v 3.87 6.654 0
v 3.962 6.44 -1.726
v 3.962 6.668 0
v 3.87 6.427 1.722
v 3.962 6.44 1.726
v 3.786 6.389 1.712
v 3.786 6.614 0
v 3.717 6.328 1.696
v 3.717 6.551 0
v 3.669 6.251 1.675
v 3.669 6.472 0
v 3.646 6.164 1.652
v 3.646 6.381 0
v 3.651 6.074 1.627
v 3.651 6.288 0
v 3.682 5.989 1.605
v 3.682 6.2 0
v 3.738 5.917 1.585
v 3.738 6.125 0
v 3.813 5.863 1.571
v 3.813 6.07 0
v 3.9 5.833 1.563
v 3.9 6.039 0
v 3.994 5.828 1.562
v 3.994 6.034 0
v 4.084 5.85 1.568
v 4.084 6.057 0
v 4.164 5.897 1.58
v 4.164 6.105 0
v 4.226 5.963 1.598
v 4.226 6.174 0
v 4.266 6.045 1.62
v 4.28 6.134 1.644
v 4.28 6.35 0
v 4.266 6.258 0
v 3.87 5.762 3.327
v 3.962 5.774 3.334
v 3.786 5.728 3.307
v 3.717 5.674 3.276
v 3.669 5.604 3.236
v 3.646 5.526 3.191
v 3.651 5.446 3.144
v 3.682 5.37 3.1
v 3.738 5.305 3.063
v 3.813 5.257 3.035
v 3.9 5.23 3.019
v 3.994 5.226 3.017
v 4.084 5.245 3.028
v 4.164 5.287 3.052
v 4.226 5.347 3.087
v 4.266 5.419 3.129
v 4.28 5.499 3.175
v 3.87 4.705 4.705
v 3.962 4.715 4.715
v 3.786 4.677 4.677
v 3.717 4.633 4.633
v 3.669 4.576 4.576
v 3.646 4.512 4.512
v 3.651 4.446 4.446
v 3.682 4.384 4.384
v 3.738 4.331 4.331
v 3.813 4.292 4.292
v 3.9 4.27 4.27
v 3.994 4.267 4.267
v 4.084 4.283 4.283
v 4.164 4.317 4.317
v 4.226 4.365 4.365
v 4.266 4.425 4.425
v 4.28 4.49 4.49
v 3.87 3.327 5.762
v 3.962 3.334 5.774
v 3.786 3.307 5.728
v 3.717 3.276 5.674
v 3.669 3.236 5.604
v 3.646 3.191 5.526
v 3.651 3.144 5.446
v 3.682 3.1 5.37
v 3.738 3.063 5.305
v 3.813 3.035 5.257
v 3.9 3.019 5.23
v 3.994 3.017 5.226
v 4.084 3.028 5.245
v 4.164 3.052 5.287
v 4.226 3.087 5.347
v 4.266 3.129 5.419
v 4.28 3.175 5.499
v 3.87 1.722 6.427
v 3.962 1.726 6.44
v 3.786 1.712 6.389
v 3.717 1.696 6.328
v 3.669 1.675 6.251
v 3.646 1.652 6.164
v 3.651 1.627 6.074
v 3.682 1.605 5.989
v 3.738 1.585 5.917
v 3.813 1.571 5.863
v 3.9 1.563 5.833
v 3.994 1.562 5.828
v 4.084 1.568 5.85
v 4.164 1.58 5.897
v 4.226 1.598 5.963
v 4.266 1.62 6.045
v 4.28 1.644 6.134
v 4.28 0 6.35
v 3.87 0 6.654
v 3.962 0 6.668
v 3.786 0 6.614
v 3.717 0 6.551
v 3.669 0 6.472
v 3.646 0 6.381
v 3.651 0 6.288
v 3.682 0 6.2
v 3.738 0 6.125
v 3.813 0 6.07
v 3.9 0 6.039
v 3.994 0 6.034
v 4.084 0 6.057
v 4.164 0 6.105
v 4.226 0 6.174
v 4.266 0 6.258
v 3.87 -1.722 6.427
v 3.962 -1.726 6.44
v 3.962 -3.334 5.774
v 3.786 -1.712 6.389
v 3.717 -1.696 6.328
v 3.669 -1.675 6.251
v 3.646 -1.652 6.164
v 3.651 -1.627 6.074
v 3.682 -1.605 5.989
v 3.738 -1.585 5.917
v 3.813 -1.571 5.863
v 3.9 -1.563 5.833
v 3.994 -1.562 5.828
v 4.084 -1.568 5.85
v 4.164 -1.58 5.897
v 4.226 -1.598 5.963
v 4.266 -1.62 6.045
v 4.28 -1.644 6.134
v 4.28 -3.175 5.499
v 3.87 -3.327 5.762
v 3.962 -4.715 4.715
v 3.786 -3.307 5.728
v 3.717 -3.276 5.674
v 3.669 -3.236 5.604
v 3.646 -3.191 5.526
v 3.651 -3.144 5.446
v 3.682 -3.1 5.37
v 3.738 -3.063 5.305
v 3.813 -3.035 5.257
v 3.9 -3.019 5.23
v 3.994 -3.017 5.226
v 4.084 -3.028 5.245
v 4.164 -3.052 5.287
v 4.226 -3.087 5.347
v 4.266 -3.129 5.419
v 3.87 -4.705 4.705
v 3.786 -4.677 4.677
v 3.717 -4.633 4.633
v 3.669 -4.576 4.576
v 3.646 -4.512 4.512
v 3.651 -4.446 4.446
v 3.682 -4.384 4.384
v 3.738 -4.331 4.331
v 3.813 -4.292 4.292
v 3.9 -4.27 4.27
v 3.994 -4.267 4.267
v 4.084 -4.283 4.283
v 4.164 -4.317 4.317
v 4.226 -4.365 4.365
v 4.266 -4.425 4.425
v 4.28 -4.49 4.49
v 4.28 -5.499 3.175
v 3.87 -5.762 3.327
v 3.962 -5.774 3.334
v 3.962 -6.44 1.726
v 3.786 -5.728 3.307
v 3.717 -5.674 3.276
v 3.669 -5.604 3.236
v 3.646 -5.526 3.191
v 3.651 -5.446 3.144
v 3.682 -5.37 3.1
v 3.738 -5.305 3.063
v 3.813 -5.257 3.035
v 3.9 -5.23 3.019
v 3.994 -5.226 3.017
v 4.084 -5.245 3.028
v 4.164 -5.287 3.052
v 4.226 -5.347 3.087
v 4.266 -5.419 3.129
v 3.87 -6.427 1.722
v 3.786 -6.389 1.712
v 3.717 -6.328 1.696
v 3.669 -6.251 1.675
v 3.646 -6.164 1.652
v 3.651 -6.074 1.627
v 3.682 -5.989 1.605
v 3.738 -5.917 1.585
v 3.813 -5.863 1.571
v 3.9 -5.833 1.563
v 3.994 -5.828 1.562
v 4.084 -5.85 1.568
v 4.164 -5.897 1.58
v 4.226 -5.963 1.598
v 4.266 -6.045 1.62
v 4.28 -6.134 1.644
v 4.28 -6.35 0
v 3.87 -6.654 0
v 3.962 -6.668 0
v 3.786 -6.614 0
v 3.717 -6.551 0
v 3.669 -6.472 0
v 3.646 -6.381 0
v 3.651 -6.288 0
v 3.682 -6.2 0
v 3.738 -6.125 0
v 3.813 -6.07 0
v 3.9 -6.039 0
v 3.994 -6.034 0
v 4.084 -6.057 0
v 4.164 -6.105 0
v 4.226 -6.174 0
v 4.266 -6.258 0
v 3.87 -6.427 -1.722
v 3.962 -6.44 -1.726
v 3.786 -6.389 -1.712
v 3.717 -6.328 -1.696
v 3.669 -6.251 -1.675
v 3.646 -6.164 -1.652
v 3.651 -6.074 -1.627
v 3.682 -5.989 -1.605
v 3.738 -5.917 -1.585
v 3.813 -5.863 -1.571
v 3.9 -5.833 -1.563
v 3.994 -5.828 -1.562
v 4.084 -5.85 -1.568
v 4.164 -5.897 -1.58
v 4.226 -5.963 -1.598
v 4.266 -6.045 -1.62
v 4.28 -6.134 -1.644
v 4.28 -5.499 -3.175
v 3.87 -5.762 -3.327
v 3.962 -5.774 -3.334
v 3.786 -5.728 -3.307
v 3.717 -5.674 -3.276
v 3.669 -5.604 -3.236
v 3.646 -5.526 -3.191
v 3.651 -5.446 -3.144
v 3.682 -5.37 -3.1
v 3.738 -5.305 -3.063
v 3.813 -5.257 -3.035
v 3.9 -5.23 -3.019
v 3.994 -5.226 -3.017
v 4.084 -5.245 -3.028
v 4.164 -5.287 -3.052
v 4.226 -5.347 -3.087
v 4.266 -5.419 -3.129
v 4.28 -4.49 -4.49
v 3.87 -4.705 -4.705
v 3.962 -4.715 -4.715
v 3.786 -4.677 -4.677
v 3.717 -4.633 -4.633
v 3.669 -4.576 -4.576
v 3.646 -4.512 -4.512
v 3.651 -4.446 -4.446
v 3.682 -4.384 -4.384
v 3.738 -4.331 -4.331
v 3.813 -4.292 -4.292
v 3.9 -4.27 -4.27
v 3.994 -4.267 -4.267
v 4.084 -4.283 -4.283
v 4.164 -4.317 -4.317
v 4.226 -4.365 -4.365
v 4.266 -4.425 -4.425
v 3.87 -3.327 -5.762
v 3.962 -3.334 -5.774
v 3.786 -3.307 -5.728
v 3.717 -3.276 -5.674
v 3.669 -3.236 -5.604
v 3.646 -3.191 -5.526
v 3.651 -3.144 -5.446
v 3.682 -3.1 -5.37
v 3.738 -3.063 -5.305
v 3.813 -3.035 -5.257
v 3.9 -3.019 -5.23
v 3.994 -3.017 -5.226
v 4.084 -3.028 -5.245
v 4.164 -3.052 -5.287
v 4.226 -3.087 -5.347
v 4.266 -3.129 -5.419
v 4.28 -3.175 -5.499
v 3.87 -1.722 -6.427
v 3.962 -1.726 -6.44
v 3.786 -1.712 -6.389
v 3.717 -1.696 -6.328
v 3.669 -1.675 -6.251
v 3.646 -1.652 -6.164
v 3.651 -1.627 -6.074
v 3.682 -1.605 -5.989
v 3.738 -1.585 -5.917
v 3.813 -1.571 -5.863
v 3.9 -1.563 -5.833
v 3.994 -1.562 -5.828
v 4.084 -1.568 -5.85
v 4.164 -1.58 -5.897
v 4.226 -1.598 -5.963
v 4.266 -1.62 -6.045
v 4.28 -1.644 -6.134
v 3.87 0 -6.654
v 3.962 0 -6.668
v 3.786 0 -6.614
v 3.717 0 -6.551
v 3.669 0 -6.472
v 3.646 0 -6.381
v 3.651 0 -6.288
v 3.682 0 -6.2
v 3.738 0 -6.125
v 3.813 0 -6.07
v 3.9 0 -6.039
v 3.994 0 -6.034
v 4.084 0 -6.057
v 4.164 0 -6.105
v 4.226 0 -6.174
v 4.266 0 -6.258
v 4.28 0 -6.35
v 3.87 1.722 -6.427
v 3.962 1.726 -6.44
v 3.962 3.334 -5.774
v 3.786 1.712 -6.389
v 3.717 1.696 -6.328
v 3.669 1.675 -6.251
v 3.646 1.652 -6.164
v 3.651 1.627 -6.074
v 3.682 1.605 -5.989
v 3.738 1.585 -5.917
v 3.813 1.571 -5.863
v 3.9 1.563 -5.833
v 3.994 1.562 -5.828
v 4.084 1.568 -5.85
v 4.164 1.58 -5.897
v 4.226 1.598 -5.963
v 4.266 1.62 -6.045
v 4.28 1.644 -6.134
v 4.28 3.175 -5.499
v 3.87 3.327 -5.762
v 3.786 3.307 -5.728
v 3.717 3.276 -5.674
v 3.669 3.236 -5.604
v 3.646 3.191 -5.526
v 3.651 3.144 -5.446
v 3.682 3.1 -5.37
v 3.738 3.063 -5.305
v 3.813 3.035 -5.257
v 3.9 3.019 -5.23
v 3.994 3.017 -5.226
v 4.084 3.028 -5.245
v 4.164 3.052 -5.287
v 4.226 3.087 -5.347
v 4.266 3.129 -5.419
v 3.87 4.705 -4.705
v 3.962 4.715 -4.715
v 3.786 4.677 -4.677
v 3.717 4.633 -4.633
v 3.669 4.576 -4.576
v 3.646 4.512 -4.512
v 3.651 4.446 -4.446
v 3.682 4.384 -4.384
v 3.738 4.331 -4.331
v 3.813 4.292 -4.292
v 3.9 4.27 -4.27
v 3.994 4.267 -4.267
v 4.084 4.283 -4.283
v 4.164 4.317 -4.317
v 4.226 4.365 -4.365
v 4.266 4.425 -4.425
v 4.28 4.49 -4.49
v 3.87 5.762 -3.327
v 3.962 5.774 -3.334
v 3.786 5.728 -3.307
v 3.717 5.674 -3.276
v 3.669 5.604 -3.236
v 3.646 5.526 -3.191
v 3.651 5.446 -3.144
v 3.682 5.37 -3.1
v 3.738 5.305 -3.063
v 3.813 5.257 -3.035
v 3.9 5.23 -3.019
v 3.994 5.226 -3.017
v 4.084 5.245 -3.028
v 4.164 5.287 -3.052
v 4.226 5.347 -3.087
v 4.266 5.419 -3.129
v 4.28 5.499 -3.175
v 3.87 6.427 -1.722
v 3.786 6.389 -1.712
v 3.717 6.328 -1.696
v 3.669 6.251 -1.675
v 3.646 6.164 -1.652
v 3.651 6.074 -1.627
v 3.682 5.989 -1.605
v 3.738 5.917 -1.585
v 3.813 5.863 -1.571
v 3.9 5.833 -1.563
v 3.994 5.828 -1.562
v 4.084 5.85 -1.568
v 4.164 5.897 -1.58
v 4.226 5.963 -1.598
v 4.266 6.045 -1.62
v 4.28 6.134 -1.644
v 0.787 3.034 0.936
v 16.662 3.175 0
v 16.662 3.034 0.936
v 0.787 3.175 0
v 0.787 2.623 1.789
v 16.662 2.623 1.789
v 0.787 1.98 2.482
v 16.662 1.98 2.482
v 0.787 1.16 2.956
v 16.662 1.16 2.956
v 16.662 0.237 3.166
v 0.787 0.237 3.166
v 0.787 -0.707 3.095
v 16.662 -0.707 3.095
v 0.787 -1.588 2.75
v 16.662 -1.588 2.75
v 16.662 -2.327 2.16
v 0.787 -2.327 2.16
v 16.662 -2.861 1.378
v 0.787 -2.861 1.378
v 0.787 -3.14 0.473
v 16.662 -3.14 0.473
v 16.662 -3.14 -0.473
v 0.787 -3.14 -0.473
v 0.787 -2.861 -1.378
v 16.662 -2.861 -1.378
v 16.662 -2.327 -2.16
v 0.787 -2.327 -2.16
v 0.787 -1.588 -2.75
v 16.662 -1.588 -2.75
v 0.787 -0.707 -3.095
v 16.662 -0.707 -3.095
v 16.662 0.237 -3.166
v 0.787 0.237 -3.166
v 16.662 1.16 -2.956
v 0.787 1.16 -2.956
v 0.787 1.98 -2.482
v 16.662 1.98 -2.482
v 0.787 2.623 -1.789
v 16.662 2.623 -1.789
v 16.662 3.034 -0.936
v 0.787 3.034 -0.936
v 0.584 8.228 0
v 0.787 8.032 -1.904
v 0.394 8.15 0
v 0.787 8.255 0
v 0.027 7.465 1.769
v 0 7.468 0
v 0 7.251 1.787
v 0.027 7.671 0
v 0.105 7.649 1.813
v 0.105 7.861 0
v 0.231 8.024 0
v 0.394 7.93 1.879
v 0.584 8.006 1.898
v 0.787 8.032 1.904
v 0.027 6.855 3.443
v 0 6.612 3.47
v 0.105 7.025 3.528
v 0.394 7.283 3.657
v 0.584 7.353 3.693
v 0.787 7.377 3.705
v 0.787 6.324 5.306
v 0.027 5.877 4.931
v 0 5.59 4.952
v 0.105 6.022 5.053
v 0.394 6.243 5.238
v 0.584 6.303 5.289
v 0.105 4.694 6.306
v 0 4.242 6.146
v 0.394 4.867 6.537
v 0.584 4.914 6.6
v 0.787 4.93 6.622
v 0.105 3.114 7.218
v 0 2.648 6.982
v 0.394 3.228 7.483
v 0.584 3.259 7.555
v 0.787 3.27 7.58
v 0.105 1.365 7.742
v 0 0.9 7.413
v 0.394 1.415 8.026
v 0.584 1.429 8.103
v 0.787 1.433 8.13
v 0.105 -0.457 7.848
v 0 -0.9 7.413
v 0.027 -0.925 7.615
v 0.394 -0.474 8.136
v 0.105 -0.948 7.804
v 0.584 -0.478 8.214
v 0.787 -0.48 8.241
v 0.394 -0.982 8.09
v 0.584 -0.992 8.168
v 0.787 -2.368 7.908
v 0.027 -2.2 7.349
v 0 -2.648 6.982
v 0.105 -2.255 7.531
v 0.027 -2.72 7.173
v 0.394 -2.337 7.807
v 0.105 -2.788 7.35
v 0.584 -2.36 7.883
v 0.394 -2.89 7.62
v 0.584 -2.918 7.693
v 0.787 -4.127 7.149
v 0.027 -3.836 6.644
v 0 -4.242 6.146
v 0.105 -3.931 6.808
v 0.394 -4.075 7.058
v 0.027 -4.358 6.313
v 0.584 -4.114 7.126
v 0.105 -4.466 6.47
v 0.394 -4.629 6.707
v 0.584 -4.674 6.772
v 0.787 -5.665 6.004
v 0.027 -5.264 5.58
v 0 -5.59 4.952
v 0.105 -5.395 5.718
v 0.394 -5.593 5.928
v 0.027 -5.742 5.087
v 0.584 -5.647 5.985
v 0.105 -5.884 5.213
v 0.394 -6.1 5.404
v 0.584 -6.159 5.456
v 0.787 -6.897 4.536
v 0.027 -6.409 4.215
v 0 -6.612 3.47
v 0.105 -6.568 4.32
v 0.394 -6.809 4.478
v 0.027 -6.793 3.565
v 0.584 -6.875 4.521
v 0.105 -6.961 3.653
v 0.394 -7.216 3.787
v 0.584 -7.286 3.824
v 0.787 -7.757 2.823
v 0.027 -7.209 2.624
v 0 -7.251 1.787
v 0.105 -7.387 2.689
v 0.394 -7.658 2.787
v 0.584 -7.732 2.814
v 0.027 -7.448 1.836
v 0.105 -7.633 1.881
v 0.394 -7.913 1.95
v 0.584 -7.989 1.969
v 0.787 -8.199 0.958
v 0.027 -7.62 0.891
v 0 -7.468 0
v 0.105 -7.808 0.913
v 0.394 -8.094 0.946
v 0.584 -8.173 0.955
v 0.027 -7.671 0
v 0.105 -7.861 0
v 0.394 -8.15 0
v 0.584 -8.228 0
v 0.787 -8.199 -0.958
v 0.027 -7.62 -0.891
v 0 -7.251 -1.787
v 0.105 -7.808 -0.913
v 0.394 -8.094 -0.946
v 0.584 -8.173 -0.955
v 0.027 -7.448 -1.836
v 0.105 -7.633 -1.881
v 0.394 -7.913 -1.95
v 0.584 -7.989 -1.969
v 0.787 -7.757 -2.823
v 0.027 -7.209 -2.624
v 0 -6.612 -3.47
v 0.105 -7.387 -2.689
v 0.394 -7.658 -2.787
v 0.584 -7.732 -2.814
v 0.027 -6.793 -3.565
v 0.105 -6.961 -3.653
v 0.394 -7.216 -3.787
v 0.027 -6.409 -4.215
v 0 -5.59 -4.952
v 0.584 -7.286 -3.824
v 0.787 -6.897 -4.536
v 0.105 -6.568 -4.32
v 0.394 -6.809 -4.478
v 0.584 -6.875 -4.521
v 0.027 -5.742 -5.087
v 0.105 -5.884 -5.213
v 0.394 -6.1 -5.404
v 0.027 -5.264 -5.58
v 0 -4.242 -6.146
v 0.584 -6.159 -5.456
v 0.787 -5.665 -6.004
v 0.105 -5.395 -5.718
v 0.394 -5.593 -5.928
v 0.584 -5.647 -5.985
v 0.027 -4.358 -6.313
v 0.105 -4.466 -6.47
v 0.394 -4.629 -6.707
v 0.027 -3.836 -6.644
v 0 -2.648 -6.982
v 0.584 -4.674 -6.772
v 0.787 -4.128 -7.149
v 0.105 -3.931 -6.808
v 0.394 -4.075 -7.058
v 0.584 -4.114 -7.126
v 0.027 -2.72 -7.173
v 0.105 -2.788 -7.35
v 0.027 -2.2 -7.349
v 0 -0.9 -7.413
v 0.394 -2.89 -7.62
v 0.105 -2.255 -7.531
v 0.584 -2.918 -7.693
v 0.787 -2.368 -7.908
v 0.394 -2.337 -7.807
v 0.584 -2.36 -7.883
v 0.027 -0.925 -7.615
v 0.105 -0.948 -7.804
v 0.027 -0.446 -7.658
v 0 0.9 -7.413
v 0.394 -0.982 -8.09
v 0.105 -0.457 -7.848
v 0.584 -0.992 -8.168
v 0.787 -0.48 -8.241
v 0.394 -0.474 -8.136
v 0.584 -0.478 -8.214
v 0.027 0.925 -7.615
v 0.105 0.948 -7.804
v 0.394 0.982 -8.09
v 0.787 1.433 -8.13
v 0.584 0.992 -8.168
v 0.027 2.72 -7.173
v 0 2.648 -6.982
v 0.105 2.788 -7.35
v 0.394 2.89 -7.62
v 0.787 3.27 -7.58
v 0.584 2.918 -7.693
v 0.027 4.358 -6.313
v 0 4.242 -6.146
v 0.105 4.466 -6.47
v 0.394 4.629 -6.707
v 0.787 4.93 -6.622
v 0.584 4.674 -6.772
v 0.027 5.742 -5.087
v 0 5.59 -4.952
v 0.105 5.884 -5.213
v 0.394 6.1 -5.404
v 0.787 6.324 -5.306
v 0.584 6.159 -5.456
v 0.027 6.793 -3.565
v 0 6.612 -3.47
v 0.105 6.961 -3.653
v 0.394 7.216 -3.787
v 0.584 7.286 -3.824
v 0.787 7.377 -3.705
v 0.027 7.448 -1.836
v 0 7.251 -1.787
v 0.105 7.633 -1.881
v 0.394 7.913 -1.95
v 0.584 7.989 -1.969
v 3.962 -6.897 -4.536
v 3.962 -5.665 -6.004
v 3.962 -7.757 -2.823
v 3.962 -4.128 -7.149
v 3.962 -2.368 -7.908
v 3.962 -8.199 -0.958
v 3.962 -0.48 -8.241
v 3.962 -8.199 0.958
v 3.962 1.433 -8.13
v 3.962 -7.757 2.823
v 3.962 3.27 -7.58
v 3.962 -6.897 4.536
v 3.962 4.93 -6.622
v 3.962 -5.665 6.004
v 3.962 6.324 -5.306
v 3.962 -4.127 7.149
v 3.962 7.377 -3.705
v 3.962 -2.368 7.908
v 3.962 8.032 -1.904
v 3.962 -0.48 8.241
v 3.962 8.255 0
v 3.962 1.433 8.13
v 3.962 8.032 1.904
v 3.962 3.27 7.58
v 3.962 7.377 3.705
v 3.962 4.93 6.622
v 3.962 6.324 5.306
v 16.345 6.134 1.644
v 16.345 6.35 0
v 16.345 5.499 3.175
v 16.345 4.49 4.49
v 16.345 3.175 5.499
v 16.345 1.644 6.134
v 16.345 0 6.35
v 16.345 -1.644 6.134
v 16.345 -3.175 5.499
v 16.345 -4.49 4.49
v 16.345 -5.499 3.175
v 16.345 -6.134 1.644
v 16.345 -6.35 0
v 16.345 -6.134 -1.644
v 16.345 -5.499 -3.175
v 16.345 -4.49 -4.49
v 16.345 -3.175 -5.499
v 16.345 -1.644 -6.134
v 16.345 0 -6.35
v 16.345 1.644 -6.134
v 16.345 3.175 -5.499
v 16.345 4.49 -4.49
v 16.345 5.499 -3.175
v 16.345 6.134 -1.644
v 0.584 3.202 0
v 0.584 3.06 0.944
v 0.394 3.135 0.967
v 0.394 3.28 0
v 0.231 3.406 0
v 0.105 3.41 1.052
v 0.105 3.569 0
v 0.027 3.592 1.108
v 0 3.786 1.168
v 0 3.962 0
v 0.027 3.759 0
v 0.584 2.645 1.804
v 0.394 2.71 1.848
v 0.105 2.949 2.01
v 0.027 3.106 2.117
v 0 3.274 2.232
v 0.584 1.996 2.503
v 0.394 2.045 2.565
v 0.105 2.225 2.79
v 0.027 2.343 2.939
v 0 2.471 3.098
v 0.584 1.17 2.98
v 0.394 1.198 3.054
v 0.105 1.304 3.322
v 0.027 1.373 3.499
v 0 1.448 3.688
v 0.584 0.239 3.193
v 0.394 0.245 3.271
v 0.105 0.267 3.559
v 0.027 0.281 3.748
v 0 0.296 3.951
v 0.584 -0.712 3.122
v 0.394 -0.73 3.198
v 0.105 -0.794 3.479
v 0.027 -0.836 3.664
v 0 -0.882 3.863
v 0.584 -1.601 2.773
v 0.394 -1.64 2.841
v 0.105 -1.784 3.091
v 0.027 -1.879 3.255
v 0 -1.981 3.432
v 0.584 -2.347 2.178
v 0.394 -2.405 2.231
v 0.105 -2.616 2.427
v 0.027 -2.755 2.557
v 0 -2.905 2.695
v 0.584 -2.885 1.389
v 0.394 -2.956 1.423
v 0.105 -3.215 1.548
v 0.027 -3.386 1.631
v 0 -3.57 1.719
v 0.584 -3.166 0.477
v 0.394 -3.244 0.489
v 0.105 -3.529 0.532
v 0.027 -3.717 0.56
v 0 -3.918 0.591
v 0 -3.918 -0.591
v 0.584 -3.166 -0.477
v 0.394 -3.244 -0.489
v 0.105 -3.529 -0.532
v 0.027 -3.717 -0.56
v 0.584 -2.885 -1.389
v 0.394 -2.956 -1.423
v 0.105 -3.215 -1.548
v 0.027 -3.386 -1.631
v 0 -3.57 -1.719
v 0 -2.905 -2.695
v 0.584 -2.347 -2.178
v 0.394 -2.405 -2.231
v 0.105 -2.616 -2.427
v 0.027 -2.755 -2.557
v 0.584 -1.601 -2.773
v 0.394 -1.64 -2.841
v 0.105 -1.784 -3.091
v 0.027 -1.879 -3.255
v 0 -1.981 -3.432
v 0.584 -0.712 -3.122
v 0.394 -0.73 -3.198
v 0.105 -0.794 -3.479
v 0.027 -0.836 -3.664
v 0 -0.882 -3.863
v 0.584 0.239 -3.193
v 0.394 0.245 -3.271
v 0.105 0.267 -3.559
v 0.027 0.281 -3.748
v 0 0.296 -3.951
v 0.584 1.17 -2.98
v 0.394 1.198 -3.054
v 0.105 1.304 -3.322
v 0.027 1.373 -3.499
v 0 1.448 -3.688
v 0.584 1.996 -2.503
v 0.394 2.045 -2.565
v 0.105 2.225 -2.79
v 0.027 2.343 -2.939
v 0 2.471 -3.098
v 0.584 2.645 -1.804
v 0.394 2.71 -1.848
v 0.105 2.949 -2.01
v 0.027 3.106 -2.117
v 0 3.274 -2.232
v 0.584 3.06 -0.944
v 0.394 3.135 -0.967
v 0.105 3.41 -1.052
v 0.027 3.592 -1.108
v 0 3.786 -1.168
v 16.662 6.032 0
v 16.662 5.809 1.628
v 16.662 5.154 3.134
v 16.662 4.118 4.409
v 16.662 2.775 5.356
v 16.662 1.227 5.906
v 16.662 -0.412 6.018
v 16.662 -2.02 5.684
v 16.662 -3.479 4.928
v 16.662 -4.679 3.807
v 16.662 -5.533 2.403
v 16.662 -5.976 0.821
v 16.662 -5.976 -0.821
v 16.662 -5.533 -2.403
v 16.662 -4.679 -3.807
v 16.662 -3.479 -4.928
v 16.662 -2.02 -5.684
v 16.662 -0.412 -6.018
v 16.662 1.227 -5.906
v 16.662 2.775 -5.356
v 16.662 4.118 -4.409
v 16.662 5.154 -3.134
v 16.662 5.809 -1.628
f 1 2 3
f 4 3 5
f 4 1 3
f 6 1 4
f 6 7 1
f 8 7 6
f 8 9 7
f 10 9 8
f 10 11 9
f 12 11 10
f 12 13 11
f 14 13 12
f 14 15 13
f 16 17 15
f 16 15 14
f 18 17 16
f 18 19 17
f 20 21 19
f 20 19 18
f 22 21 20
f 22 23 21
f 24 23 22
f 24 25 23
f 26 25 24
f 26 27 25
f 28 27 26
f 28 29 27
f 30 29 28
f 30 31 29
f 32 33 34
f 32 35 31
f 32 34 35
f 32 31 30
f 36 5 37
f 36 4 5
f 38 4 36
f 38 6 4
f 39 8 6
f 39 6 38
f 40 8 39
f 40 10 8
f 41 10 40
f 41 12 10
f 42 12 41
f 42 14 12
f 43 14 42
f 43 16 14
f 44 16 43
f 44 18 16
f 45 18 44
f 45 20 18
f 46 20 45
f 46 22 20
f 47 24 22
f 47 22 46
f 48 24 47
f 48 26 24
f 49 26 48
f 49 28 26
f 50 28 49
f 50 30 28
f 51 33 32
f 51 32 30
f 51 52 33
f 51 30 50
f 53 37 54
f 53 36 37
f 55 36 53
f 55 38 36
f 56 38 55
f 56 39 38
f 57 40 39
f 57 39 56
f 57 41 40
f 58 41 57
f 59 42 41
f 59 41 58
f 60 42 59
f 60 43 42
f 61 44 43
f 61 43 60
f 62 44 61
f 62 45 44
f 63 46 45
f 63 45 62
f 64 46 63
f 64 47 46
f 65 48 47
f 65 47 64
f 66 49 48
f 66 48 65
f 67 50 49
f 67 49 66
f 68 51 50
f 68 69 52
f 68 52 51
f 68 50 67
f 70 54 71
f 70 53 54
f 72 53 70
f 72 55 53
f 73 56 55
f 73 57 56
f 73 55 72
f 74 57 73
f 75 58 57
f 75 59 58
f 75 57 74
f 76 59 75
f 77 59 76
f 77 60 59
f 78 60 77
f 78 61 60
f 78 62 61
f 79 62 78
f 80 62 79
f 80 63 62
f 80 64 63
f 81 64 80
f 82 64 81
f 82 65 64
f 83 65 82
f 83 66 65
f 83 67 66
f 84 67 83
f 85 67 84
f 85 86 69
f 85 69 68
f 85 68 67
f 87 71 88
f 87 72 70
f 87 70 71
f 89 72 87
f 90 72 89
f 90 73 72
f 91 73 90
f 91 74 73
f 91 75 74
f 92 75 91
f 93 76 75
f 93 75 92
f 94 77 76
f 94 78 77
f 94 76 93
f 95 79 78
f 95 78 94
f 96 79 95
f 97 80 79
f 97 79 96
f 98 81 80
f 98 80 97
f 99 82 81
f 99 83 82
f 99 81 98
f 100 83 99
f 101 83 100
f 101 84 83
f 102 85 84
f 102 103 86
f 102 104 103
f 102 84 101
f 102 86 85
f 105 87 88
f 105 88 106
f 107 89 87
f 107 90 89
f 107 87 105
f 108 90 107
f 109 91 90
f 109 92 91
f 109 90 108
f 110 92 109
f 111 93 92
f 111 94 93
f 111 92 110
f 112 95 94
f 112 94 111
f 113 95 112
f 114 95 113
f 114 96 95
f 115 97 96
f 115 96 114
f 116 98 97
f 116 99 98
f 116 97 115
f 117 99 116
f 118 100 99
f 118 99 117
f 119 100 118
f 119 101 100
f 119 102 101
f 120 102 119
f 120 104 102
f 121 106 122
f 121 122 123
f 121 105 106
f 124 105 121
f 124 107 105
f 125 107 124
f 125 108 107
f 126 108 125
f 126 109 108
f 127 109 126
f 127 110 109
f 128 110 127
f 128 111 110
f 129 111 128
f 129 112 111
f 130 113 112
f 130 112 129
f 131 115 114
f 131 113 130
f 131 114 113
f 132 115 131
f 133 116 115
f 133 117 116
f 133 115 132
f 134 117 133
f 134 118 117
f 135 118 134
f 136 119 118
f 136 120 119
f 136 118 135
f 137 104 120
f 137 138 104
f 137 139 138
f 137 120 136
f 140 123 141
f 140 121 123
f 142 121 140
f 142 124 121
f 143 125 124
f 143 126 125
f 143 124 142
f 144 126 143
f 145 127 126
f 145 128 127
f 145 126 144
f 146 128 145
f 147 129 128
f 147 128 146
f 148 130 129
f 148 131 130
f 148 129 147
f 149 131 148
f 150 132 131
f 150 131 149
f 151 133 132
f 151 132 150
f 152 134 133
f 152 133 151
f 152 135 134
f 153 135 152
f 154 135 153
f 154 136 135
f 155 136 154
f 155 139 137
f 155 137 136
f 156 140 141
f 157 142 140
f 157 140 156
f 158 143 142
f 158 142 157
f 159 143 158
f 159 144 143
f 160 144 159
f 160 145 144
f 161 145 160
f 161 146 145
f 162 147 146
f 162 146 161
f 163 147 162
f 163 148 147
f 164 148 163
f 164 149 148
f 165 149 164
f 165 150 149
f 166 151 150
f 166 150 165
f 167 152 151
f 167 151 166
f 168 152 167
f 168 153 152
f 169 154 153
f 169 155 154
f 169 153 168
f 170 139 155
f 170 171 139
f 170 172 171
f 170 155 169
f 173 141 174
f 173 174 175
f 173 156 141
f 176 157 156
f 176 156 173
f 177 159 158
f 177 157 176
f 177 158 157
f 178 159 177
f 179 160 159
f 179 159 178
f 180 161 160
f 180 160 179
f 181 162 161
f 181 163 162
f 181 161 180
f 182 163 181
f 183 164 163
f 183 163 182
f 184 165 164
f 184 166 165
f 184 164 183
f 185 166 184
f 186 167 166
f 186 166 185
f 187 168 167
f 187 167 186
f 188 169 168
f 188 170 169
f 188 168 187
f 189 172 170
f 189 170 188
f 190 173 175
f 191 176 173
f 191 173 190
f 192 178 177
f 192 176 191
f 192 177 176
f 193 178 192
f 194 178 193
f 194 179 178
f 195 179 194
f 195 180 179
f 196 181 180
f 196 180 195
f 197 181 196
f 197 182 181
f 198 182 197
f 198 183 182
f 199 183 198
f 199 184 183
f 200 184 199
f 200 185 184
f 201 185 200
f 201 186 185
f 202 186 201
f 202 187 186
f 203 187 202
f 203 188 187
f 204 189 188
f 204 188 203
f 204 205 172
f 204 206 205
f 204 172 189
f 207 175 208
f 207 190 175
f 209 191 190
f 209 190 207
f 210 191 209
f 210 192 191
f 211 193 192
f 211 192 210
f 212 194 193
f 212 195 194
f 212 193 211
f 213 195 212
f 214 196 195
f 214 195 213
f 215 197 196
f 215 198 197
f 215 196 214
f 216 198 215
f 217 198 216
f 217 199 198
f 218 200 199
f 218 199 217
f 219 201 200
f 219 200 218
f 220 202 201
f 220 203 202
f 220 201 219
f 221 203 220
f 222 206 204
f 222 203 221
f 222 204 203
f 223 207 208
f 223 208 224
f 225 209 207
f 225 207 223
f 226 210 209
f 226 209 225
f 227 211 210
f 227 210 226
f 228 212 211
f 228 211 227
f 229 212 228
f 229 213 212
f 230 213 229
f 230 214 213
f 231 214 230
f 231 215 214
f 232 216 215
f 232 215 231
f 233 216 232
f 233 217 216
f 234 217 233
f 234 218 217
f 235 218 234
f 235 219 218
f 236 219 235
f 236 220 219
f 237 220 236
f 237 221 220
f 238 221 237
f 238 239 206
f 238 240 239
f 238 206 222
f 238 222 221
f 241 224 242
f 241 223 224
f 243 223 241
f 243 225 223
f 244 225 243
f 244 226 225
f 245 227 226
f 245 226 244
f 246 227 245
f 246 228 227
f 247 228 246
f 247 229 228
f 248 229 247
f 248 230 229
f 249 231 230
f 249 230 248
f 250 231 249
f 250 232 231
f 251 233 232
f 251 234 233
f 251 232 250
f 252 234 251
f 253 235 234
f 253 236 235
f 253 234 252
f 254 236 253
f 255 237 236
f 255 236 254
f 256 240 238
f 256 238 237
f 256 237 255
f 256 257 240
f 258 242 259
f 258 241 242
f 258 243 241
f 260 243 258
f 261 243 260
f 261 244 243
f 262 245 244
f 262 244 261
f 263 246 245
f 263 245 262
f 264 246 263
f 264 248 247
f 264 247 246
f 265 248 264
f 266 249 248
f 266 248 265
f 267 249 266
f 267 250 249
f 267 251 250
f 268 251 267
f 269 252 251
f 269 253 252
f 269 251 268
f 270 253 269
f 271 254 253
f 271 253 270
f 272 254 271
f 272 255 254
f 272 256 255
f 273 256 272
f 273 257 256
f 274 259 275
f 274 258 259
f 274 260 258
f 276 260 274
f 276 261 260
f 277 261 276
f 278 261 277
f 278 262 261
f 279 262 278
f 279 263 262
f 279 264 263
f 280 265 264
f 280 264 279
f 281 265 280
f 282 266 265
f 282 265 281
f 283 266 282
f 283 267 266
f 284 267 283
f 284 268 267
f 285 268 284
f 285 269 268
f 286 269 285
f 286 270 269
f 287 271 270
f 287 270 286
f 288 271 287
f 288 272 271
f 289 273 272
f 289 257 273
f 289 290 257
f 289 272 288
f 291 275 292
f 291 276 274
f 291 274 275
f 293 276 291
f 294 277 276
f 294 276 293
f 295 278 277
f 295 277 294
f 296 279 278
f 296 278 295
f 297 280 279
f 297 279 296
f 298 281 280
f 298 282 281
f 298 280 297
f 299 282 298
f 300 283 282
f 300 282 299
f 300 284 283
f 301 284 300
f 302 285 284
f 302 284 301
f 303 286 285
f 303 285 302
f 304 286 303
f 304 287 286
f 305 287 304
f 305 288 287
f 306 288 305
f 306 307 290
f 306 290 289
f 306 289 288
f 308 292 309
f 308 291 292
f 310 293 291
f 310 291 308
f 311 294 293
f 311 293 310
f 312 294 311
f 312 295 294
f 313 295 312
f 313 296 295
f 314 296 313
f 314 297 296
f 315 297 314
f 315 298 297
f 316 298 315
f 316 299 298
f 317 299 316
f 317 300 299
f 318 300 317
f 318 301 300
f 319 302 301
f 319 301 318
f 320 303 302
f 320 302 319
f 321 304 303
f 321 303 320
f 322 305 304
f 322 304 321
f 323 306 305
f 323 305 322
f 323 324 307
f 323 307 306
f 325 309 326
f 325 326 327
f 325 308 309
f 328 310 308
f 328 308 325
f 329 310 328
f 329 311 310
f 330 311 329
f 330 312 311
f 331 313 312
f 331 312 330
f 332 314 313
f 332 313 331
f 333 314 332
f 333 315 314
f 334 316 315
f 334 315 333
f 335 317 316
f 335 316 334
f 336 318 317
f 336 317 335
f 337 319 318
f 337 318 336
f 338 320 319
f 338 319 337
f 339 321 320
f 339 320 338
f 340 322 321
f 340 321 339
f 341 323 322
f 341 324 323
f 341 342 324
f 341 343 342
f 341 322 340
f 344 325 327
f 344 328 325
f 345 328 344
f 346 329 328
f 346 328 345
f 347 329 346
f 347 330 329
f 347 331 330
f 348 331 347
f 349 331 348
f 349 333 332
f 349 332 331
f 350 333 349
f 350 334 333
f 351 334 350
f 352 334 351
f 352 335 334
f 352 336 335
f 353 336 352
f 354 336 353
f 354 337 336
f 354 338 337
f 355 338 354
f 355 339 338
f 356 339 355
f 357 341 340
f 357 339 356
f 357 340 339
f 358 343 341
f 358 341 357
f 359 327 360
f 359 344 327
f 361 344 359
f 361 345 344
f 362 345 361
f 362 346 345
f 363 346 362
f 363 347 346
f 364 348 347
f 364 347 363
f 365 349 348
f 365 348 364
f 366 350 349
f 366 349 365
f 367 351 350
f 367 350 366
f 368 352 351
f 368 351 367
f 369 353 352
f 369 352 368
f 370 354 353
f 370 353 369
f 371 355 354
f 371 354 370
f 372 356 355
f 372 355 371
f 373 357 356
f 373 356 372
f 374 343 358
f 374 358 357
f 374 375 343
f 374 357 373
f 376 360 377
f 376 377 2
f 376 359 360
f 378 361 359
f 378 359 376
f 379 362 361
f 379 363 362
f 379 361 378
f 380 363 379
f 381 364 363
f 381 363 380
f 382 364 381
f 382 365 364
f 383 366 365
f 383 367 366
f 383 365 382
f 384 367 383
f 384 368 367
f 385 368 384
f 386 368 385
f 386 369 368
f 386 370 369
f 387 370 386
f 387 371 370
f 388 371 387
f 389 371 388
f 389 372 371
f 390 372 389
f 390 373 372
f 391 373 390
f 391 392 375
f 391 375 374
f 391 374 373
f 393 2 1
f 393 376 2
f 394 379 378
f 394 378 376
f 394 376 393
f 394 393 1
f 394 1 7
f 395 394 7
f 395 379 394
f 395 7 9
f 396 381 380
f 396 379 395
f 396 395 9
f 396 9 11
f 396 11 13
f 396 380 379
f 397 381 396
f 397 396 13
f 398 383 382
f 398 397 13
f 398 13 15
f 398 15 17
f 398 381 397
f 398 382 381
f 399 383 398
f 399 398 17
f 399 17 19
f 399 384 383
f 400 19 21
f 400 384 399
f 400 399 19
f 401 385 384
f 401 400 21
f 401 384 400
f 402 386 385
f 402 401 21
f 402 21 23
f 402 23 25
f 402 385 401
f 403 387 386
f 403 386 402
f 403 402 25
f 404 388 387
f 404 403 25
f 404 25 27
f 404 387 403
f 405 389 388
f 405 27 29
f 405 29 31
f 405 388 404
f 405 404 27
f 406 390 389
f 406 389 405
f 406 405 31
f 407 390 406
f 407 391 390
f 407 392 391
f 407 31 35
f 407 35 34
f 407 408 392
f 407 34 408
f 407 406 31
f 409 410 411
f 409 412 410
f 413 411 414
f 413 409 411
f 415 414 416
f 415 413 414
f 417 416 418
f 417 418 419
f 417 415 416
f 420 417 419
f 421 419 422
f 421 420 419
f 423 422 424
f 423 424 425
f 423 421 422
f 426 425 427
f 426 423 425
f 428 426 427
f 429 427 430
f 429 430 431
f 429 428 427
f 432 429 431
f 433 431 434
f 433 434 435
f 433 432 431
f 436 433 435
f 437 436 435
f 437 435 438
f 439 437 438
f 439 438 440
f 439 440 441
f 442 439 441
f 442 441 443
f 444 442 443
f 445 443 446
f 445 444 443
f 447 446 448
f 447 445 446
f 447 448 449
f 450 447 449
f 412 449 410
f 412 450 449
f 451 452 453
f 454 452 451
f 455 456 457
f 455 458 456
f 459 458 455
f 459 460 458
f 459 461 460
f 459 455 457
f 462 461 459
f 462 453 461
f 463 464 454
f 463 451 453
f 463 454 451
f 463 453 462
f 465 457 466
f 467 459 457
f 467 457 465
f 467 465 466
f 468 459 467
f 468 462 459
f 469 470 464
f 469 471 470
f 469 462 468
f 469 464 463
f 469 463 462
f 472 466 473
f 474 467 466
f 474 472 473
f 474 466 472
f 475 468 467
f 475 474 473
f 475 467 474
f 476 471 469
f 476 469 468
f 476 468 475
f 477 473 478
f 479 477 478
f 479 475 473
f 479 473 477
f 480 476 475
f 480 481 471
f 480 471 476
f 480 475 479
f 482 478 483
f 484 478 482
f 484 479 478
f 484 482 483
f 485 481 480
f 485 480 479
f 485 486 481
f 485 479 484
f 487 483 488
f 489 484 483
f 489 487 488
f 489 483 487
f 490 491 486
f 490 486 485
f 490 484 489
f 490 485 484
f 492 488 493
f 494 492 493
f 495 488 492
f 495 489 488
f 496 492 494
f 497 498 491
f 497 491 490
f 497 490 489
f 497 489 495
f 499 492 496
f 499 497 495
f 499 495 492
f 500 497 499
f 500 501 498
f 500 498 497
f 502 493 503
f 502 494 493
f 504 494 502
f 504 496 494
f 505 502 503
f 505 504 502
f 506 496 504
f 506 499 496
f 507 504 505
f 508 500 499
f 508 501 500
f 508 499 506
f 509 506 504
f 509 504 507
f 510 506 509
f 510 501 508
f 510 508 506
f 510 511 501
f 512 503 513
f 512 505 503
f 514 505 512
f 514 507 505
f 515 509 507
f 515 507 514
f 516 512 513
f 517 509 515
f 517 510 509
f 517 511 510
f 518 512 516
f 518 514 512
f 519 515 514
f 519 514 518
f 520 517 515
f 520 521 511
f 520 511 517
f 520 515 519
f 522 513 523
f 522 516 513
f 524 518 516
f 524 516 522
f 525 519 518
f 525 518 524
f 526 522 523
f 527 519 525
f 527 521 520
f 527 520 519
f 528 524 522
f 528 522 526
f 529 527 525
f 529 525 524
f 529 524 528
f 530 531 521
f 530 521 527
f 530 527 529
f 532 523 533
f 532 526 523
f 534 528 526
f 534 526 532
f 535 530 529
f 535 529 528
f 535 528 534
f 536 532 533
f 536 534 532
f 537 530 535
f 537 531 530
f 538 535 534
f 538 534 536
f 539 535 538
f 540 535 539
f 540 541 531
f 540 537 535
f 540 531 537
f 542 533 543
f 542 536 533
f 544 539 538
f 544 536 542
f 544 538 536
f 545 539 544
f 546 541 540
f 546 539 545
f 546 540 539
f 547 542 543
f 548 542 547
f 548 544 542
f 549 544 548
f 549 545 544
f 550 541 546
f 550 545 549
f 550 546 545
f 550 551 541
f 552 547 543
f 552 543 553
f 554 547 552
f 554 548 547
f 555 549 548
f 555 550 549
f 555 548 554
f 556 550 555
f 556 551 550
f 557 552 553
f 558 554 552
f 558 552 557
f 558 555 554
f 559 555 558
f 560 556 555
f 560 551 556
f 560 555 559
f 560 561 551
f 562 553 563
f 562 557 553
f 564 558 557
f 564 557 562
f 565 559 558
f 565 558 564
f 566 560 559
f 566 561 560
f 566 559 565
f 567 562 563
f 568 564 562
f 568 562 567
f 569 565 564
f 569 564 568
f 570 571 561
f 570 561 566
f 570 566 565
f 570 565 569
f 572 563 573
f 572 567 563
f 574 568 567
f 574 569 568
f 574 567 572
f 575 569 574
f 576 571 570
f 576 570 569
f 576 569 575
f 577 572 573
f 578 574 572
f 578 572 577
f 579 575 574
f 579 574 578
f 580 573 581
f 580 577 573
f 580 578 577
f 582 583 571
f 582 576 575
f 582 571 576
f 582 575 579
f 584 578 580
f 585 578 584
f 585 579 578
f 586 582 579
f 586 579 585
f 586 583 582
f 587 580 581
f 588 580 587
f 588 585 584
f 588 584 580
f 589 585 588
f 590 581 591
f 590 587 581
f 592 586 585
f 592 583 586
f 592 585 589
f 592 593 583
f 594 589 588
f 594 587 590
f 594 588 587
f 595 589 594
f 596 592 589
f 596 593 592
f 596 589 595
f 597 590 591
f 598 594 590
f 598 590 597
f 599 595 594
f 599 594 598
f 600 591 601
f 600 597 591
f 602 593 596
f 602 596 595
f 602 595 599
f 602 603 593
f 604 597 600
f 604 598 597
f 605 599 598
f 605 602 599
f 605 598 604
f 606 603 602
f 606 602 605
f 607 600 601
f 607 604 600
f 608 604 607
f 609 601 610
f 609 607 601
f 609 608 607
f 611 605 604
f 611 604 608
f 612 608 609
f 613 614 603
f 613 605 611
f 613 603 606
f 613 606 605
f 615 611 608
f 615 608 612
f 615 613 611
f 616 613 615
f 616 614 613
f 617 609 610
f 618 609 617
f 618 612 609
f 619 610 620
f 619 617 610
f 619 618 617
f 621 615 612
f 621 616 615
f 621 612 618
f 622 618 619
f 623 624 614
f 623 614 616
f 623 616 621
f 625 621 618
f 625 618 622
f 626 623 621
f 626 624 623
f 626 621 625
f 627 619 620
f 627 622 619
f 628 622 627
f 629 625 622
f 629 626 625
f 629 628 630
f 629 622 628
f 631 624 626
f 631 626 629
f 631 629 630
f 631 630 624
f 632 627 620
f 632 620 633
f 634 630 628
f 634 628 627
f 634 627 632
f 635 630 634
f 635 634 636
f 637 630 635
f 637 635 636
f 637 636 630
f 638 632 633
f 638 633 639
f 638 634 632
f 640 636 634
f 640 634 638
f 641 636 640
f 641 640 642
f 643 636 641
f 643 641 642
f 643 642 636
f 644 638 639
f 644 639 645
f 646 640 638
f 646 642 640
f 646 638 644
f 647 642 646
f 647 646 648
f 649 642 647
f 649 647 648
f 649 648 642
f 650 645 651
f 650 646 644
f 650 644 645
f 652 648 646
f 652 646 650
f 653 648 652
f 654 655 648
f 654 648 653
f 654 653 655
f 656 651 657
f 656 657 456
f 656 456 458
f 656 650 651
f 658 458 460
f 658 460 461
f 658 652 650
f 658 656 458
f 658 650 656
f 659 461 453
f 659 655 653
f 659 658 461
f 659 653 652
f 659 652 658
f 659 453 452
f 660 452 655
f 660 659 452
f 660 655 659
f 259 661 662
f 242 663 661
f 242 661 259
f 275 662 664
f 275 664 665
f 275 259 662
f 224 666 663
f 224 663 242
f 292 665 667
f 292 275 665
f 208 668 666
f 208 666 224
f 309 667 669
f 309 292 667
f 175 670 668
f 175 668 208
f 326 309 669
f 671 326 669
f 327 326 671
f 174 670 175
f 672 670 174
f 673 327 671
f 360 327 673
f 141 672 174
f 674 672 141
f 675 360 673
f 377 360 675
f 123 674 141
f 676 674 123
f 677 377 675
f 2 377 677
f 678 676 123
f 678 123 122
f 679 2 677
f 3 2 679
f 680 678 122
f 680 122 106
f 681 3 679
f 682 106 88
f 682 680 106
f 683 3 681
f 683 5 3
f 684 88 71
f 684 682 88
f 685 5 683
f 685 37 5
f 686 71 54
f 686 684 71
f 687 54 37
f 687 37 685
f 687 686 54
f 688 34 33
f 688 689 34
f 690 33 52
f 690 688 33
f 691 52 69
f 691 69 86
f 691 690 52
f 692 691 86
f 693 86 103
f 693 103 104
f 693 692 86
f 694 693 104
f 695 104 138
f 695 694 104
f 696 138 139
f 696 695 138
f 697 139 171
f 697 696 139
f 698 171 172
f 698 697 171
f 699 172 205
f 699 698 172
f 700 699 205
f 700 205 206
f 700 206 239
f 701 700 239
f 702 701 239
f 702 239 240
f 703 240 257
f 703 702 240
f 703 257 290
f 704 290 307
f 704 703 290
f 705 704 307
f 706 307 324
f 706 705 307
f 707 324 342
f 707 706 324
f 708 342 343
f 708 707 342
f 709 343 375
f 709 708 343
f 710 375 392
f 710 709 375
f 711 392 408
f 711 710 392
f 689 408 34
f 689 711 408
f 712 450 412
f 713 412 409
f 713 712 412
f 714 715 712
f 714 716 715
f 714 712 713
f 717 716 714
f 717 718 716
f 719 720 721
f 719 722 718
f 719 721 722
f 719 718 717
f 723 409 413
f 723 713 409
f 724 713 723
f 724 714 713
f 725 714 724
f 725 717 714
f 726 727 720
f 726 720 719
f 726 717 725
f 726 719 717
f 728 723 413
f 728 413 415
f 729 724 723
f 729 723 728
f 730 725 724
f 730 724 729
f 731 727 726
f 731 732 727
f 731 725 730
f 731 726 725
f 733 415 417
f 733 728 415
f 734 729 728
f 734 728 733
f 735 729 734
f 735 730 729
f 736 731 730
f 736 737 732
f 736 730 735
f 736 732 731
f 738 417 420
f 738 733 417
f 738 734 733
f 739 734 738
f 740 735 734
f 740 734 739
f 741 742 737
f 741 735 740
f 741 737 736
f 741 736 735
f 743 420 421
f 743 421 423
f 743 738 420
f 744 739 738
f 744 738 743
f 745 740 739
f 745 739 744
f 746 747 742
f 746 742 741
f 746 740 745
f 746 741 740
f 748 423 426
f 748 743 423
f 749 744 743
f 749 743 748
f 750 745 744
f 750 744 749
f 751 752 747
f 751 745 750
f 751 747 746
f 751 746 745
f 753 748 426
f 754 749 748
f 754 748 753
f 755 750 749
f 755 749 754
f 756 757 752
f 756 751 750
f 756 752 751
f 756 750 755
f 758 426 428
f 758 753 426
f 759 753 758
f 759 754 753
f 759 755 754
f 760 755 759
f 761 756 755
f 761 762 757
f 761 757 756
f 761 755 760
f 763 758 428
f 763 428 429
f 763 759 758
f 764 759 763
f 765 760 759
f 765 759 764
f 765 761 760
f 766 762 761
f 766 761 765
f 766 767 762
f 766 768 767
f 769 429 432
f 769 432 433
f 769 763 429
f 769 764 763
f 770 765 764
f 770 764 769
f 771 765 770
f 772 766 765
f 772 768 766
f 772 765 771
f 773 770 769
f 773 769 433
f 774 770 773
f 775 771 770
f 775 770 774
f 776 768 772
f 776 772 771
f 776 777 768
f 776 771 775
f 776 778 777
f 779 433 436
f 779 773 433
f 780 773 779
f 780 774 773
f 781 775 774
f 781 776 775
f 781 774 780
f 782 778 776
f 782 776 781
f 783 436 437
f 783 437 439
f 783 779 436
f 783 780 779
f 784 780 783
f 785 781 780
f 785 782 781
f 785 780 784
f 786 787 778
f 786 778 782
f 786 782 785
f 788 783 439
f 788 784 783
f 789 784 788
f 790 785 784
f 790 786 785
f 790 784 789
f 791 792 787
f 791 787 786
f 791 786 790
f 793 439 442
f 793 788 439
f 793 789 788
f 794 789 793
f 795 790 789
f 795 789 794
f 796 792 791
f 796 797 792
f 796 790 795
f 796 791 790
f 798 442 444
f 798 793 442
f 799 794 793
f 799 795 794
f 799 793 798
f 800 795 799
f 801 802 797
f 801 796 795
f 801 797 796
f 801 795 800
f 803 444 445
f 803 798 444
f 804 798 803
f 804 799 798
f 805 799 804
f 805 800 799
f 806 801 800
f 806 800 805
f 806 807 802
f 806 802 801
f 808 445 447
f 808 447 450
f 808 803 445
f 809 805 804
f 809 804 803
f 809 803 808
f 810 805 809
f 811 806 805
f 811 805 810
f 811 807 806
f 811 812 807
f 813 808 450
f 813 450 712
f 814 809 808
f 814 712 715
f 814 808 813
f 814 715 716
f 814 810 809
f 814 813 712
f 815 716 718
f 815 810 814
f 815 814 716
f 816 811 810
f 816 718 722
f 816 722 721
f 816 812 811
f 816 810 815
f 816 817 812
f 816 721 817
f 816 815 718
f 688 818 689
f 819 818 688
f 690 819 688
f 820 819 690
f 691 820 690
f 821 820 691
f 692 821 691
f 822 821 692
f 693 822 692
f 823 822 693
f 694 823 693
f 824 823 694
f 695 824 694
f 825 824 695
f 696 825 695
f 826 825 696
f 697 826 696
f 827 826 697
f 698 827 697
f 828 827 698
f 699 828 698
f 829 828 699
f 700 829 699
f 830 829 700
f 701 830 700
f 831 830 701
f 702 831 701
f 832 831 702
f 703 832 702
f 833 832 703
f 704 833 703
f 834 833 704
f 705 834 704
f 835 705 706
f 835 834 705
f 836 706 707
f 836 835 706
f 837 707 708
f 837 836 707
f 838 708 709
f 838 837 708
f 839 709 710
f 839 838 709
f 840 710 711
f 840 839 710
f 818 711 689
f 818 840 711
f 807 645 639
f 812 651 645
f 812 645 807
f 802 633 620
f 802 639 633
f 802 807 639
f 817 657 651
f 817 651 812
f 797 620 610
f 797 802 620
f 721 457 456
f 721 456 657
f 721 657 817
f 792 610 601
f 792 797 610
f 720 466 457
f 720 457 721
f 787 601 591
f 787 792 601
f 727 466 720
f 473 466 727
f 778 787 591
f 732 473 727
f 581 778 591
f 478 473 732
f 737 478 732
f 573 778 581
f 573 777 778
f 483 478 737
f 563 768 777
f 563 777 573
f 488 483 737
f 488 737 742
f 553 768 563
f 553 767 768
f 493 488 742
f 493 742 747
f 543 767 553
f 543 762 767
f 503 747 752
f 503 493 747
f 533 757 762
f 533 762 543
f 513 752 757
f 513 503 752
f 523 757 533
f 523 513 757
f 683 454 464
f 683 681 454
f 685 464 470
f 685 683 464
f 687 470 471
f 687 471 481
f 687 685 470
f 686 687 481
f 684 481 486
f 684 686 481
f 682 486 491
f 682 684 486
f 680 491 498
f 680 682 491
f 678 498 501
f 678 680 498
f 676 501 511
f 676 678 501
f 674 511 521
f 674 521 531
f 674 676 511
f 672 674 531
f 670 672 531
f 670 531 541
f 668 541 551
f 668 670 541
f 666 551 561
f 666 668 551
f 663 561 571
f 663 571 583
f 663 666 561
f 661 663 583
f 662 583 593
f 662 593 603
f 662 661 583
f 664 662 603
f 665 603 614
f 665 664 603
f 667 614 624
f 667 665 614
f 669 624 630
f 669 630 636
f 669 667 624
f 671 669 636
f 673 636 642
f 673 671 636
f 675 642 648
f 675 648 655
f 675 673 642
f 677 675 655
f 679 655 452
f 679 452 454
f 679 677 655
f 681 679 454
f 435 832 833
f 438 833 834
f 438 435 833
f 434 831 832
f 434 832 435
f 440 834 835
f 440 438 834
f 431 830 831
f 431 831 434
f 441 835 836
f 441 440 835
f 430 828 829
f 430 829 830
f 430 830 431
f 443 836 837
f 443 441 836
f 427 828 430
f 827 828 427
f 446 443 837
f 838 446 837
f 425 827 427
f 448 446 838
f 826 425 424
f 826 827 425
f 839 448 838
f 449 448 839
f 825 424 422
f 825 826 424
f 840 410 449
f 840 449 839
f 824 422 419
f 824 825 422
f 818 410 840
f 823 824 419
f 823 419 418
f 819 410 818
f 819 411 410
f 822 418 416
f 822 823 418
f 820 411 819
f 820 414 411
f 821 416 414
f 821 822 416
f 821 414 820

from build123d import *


with BuildPart() as part:
    # Sketch1 → BaseBody (revolve)
    with BuildSketch(Plane.XY):
        with BuildLine():
            Line((0, 3.9624), (0, 7.4676))
            ThreePointArc((0, 7.4676), (0.23062412, 8.02437588), (0.7874, 8.255))
            Line((0.7874, 8.255), (3.9624, 8.255))
            Line((3.9624, 8.255), (3.9624, 6.6675))
            ThreePointArc((3.9624, 6.6675), (3.737893597, 6.125493597), (4.2799, 6.35))
            Line((4.2799, 6.35), (16.3449, 6.35))
            Line((16.3449, 6.35), (16.6624, 6.0325))
            Line((16.6624, 6.0325), (16.6624, 3.175))
            Line((16.6624, 3.175), (0.7874, 3.175))
            ThreePointArc((0.7874, 3.175), (0.23062412, 3.40562412), (0, 3.9624))
        make_face()
    revolve(axis=Axis((0, 0, 0), (1, 0, 0)))


solid = part.part
